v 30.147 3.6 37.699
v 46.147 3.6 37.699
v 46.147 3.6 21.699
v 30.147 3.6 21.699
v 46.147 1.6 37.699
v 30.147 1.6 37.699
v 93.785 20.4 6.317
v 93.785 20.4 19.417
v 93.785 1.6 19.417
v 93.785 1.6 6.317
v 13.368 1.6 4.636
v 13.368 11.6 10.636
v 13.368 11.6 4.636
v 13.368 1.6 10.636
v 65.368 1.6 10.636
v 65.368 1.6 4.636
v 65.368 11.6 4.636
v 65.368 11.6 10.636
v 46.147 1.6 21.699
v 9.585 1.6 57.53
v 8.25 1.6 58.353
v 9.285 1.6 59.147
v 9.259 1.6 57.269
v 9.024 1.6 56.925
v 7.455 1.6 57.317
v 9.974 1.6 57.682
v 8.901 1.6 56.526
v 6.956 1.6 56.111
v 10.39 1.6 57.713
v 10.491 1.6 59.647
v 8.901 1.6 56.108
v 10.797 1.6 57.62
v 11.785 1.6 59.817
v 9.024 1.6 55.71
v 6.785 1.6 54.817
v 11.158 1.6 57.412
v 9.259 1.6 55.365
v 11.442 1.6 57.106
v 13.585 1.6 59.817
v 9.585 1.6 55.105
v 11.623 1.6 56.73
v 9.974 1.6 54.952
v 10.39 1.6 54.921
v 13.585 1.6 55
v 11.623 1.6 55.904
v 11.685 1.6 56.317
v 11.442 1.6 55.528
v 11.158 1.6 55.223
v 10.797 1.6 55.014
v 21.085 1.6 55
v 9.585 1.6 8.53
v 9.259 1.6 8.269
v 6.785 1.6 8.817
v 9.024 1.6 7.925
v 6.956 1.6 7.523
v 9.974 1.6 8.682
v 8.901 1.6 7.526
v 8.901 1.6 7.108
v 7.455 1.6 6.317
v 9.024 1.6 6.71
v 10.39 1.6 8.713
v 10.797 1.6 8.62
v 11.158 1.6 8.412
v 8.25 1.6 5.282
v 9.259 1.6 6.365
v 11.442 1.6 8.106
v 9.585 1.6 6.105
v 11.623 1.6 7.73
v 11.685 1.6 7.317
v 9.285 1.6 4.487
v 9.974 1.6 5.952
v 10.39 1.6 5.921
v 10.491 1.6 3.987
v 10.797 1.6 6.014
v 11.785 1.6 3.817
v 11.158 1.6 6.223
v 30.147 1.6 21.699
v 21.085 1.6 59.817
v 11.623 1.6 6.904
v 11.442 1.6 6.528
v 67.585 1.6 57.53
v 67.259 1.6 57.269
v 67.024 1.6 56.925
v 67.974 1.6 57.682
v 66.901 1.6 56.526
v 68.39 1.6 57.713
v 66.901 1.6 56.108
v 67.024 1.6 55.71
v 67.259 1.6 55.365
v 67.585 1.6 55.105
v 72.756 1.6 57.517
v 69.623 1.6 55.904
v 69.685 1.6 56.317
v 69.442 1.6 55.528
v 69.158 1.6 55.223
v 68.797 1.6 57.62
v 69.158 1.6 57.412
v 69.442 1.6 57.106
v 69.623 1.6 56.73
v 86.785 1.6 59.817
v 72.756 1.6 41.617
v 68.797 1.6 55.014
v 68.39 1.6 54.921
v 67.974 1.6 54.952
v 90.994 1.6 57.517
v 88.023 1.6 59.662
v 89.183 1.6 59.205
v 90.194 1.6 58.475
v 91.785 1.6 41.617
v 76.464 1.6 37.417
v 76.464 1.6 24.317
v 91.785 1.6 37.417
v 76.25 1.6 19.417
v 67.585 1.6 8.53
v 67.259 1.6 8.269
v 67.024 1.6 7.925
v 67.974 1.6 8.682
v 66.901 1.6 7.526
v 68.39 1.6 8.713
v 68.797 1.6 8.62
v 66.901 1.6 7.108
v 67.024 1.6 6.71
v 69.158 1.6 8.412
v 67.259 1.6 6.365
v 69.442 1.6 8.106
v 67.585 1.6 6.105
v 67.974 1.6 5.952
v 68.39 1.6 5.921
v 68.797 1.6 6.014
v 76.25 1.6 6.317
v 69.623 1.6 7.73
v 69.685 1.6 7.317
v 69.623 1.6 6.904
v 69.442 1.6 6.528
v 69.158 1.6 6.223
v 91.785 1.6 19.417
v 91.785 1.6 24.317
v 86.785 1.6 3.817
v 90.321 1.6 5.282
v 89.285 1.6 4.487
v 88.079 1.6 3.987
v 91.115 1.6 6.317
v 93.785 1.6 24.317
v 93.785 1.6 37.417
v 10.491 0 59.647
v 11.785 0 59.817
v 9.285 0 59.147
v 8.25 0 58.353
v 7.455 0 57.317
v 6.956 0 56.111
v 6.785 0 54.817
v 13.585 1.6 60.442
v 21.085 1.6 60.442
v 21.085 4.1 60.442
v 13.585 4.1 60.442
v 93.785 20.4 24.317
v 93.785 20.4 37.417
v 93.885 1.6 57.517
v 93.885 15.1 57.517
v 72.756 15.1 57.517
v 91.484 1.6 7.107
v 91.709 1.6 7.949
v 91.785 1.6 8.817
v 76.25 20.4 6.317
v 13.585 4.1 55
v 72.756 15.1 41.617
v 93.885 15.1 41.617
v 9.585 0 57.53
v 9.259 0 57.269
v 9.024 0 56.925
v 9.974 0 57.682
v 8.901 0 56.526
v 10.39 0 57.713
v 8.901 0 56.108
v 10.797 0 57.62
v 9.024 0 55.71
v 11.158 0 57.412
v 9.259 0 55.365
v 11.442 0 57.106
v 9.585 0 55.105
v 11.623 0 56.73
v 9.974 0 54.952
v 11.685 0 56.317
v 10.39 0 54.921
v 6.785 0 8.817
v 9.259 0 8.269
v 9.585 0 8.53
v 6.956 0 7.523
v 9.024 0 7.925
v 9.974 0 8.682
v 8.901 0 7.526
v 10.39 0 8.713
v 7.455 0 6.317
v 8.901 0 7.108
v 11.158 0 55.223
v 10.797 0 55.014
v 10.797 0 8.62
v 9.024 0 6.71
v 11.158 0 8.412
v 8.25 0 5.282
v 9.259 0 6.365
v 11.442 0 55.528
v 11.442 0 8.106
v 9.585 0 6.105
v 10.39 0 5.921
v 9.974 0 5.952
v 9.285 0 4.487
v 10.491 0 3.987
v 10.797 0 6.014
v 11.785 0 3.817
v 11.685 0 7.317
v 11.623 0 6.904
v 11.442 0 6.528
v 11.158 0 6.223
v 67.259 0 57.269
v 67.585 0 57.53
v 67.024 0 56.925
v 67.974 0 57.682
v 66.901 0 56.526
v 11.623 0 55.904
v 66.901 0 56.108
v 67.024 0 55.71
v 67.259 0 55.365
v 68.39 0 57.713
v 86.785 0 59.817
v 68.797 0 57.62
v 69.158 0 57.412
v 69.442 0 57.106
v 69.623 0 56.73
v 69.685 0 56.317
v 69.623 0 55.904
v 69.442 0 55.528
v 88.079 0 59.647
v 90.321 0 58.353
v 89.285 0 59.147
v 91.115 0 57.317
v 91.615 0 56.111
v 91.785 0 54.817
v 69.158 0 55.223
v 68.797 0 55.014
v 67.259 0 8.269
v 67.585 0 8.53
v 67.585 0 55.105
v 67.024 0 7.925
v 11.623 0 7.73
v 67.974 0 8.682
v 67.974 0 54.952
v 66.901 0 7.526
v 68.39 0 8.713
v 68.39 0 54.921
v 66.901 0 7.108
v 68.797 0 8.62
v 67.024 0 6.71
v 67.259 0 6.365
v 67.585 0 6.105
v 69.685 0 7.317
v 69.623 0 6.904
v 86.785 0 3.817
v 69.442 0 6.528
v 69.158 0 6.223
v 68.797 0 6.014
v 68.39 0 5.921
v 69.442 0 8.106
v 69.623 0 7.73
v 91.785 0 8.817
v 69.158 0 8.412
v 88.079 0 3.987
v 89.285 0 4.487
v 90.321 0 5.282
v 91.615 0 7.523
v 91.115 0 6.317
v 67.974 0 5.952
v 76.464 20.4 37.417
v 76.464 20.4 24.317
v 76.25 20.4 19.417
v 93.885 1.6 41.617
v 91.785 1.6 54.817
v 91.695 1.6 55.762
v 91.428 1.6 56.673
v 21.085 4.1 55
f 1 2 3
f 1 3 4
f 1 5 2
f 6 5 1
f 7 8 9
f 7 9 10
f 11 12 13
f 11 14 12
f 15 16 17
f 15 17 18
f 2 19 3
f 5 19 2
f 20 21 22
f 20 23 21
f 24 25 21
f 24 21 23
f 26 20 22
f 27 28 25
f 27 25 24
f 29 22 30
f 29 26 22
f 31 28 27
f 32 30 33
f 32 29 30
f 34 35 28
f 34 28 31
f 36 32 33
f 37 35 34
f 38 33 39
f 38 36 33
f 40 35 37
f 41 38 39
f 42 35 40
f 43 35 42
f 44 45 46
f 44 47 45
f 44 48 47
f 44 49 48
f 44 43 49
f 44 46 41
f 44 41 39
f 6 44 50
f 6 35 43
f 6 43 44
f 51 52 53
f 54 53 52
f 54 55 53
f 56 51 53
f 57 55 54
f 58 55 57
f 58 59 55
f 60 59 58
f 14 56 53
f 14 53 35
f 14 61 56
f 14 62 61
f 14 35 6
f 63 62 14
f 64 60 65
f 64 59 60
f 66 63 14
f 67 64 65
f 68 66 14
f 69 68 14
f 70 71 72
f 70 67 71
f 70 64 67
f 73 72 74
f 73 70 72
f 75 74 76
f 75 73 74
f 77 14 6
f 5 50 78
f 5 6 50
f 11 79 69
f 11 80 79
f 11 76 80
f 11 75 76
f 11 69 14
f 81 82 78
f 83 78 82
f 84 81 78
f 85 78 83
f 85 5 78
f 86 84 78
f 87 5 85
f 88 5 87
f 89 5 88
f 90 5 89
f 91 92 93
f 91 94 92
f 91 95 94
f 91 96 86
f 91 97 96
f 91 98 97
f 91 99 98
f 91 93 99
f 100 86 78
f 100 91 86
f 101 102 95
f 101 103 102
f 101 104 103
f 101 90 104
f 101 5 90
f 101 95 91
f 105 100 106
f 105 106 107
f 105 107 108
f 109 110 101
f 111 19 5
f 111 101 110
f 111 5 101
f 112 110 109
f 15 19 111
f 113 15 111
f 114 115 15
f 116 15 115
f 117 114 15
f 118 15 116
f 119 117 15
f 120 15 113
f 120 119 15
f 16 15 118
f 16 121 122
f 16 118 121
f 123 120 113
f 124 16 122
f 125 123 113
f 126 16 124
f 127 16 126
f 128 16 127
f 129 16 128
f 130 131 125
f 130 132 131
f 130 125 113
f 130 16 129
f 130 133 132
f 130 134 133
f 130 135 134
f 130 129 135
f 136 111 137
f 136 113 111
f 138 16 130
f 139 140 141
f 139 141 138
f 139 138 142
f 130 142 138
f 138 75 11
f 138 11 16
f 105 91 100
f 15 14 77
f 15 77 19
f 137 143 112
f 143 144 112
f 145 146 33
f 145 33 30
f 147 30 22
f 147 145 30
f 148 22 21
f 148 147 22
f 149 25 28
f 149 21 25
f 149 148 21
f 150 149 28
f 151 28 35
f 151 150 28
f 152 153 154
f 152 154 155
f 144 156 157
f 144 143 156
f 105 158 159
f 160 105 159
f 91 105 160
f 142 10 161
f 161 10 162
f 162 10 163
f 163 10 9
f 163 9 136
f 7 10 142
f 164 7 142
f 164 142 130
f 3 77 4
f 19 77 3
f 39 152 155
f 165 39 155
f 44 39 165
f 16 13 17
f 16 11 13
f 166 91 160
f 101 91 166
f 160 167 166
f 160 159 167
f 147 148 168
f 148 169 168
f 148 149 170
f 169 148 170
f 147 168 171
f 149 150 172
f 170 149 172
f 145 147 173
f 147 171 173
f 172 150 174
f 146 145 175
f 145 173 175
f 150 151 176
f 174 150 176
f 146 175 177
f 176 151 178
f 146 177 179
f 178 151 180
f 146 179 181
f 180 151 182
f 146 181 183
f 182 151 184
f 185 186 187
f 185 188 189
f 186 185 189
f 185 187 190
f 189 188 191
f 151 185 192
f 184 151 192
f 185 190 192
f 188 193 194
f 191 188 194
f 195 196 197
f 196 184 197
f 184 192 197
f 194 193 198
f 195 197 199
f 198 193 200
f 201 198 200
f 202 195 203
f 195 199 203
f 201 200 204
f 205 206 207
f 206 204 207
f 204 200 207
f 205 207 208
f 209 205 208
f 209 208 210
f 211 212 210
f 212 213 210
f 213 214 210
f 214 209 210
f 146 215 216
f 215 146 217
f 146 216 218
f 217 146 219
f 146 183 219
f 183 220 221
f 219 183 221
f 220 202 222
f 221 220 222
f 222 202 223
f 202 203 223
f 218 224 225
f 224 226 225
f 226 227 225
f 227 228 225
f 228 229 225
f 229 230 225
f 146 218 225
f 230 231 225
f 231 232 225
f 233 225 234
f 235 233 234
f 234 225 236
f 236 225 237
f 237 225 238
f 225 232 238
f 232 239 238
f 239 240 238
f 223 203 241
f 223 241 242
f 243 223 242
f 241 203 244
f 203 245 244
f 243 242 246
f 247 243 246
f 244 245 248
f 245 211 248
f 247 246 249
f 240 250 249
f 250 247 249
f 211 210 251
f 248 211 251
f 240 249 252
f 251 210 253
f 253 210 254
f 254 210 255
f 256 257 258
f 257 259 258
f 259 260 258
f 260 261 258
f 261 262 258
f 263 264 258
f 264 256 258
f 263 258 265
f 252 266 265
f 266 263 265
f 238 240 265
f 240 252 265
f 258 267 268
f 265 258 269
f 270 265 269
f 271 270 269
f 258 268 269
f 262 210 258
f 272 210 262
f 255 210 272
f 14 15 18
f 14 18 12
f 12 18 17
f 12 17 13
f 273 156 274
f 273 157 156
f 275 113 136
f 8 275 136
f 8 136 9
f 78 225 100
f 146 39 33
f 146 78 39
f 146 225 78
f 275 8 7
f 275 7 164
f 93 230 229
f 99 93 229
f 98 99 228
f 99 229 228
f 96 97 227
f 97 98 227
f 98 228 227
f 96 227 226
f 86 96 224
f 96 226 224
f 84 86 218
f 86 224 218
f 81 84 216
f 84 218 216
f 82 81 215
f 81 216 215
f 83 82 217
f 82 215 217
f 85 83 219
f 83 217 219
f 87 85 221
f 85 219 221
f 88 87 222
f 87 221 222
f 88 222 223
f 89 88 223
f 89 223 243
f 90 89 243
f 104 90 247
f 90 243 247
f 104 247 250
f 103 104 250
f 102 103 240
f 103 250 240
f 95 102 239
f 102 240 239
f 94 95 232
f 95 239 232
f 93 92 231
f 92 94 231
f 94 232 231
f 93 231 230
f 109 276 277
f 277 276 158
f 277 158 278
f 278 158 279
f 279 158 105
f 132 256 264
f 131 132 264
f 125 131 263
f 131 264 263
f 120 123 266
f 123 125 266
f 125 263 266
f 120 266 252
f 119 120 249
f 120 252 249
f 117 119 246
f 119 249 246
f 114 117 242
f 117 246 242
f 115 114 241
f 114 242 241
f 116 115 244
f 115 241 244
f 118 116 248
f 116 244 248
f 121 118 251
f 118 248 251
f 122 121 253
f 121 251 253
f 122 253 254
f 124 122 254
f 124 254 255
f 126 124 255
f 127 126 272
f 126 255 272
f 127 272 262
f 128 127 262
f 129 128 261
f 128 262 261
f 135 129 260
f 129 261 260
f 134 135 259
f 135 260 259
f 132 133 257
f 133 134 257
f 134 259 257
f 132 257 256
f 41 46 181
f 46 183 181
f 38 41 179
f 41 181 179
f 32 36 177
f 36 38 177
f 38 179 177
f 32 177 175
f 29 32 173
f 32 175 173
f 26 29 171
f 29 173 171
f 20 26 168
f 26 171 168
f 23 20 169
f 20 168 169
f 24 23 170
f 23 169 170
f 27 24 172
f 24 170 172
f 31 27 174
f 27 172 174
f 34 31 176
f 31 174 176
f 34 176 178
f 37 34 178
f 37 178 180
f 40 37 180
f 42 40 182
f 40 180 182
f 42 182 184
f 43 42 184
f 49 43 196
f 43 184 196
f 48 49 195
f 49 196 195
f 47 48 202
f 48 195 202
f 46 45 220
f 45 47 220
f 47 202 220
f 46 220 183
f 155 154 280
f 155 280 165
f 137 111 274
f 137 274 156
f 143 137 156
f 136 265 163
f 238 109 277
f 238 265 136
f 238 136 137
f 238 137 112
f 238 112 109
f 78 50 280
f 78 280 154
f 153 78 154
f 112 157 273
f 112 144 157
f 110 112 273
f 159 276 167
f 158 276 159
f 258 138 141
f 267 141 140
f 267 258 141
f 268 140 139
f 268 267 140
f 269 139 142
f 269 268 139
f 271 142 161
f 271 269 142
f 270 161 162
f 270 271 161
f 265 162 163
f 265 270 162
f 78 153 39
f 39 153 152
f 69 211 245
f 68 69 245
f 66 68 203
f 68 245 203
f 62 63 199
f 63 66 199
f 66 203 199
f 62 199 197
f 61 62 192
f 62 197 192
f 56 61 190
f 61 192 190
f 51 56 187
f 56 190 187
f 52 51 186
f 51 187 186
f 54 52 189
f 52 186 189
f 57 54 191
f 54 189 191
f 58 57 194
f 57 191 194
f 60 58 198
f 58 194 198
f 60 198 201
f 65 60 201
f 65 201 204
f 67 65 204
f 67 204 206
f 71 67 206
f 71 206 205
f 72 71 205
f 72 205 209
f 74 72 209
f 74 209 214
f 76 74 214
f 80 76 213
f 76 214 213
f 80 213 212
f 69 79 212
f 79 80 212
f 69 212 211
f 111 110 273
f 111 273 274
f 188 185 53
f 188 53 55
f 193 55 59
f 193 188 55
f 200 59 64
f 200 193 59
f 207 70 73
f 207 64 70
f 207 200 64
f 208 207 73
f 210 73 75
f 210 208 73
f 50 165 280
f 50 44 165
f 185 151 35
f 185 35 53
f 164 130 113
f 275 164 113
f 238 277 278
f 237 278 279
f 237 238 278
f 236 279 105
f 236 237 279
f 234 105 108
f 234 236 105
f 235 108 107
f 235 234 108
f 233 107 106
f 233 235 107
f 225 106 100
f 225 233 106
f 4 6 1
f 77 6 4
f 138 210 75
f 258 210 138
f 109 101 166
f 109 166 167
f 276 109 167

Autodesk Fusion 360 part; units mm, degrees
sketch "Sketch1" plane through (0, 0, 0) normal (0, 1, 0) x (1, 0, 0)
  line L0 (11.7853, -3.8171) -> (86.7853, -3.8171)
  line L1 (91.7853, -8.8171) -> (91.7853, -54.8171)
  line L2 (86.7853, -59.8171) -> (11.7853, -59.8171)
  line L3 (6.7853, -54.8171) -> (6.7853, -8.8171)
  circle A0 centre (10.2853, -7.3171) radius 1.4
  circle A1 centre (10.2853, -56.3171) radius 1.4
  circle A2 centre (68.2853, -7.3171) radius 1.4
  circle A3 centre (68.2853, -56.3171) radius 1.4
  arc A4 (91.7853, -8.8171) -> (86.7853, -3.8171) centre (86.7853, -8.8171) ccw
  arc A5 (86.7853, -59.8171) -> (91.7853, -54.8171) centre (86.7853, -54.8171) ccw
  arc A6 (6.7853, -54.8171) -> (11.7853, -59.8171) centre (11.7853, -54.8171) ccw
  arc A7 (11.7853, -3.8171) -> (6.7853, -8.8171) centre (11.7853, -8.8171) ccw
  dimension "d1" = 85
  dimension "d2" = 56
  dimension "d3" = 58
  dimension "d4" = 2.8
  dimension "d5" = 3.5
  dimension "d6" = 3.5
  dimension "d7" = 49
  dimension "d8" = 5
extrude "Extrude1" add sketch "Sketch1" along normal blind 1.6 makes body 1
copy_body "Body->Comp1" bodies 1 removing the originals makes body 2 in component "PCB"
sketch "Sketch1 (2)" plane through (0, 1.6, 0) normal (0, 1, 0) x (-1, 0, 0) in component "Component"
  circle A0 centre (-68.2853, 56.3171) radius 1.4
  circle A1 centre (-68.2853, 7.3171) radius 1.4
  circle A2 centre (-10.2853, 7.3171) radius 1.4
  circle A3 centre (-10.2853, 56.3171) radius 1.4
  arc A4 (-91.7853, 8.8171) -> (-86.7853, 3.8171) centre (-86.7853, 8.8171) ccw
  line L0 (-86.7853, 3.8171) -> (-11.7853, 3.8171)
  arc A5 (-11.7853, 3.8171) -> (-6.7853, 8.8171) centre (-11.7853, 8.8171) ccw
  line L1 (-6.7853, 8.8171) -> (-6.7853, 54.8171)
  arc A6 (-6.7853, 54.8171) -> (-11.7853, 59.8171) centre (-11.7853, 54.8171) ccw
  line L2 (-11.7853, 59.8171) -> (-86.7853, 59.8171)
  arc A7 (-86.7853, 59.8171) -> (-91.7853, 54.8171) centre (-86.7853, 54.8171) ccw
  line L3 (-91.7853, 54.8171) -> (-91.7853, 8.8171)
  line L4 (-72.7561, 41.6171) -> (-93.8853, 41.6171)
  line L5 (-93.8853, 41.6171) -> (-93.8853, 57.5171)
  line L6 (-93.8853, 57.5171) -> (-72.7561, 57.5171)
  line L7 (-72.7561, 57.5171) -> (-72.7561, 41.6171)
  dimension "d11" = 15.9
  dimension "d12" = 2.3
  dimension "d13" = 87.1
extrude "Extrude1'" add sketch "Sketch1 (2)" along normal blind 13.5 contours A7 L3 L4 L5 L6 | A7 L3 L4 L6 L7 bodies 2 in component "PCB"
sketch "Sketch2" plane through (0, 1.6, 0) normal (0, 1, 0) x (-1, 0, 0)
  line L0 (-72.7561, 41.6171) -> (-91.7853, 41.6171)
  line L1 (-91.7853, 41.6171) -> (-91.7853, 8.8171)
  arc A0 (-91.7853, 8.8171) -> (-86.7853, 3.8171) centre (-86.7853, 8.8171) ccw
  line L2 (-86.7853, 3.8171) -> (-11.7853, 3.8171)
  arc A1 (-11.7853, 3.8171) -> (-6.7853, 8.8171) centre (-11.7853, 8.8171) ccw
  line L3 (-6.7853, 8.8171) -> (-6.7853, 54.8171)
  arc A2 (-6.7853, 54.8171) -> (-11.7853, 59.8171) centre (-11.7853, 54.8171) ccw
  line L4 (-11.7853, 59.8171) -> (-86.7853, 59.8171)
  arc A3 (-86.7853, 59.8171) -> (-90.9936, 57.5171) centre (-86.7853, 54.8171) ccw
  line L5 (-90.9936, 57.5171) -> (-72.7561, 57.5171)
  line L6 (-72.7561, 57.5171) -> (-72.7561, 41.6171)
  circle A4 centre (-68.2853, 56.3171) radius 1.4
  circle A5 centre (-68.2853, 7.3171) radius 1.4
  circle A6 centre (-10.2853, 56.3171) radius 1.4
  circle A7 centre (-10.2853, 7.3171) radius 1.4
  line L7 (-13.5853, 55) -> (-21.0853, 55)
  line L8 (-21.0853, 55) -> (-21.0853, 60.4415)
  line L9 (-21.0853, 60.4415) -> (-13.5853, 60.4415)
  line L10 (-13.5853, 60.4415) -> (-13.5853, 55)
  dimension "d16" = 7.5
  dimension "d17" = 6.8
extrude "Extrude2" add sketch "Sketch2" along normal blind 2.5 contours L4 L8 L9 L10 | L4 L7 L8 L10 bodies 2 in component "PCB"
sketch "Sketch3" plane through (0, 1.6, 0) normal (0, 1, 0) x (-1, 0, 0)
  line L0 (-21.0853, 55) -> (-21.0853, 59.8171)
  line L1 (-21.0853, 59.8171) -> (-86.7853, 59.8171)
  arc A0 (-86.7853, 59.8171) -> (-90.9936, 57.5171) centre (-86.7853, 54.8171) ccw
  line L2 (-90.9936, 57.5171) -> (-72.7561, 57.5171)
  line L3 (-72.7561, 57.5171) -> (-72.7561, 41.6171)
  line L4 (-72.7561, 41.6171) -> (-91.7853, 41.6171)
  line L5 (-91.7853, 41.6171) -> (-91.7853, 8.8171)
  arc A1 (-91.7853, 8.8171) -> (-86.7853, 3.8171) centre (-86.7853, 8.8171) ccw
  line L6 (-86.7853, 3.8171) -> (-11.7853, 3.8171)
  arc A2 (-11.7853, 3.8171) -> (-6.7853, 8.8171) centre (-11.7853, 8.8171) ccw
  line L7 (-6.7853, 8.8171) -> (-6.7853, 54.8171)
  arc A3 (-6.7853, 54.8171) -> (-11.7853, 59.8171) centre (-11.7853, 54.8171) ccw
  line L8 (-11.7853, 59.8171) -> (-13.5853, 59.8171)
  line L9 (-13.5853, 59.8171) -> (-13.5853, 55)
  line L10 (-13.5853, 55) -> (-21.0853, 55)
  circle A4 centre (-68.2853, 56.3171) radius 1.4
  circle A5 centre (-68.2853, 7.3171) radius 1.4
  circle A6 centre (-10.2853, 56.3171) radius 1.4
  circle A7 centre (-10.2853, 7.3171) radius 1.4
  line L11 (-13.3683, 4.6362) -> (-65.3683, 4.6362)
  line L12 (-65.3683, 4.6362) -> (-65.3683, 10.6362)
  line L13 (-65.3683, 10.6362) -> (-13.3683, 10.6362)
  line L14 (-13.3683, 10.6362) -> (-13.3683, 4.6362)
  dimension "d20" = 52
  dimension "d21" = 6
extrude "Extrude3" add sketch "Sketch3" along normal blind 10 contours L11 L12 L13 L14 bodies 2 in component "PCB"
sketch "Sketch4" plane through (0, 1.6, 0) normal (0, 1, 0) x (-1, 0, 0)
  line L0 (-13.3683, 10.6362) -> (-13.3683, 4.6362)
  line L1 (-13.3683, 4.6362) -> (-65.3683, 4.6362)
  line L2 (-65.3683, 4.6362) -> (-65.3683, 10.6362)
  line L3 (-65.3683, 10.6362) -> (-13.3683, 10.6362)
  line L4 (-21.0853, 55) -> (-21.0853, 59.8171)
  line L5 (-21.0853, 59.8171) -> (-86.7853, 59.8171)
  arc A0 (-86.7853, 59.8171) -> (-90.9936, 57.5171) centre (-86.7853, 54.8171) ccw
  line L6 (-90.9936, 57.5171) -> (-72.7561, 57.5171)
  line L7 (-72.7561, 57.5171) -> (-72.7561, 41.6171)
  line L8 (-72.7561, 41.6171) -> (-91.7853, 41.6171)
  line L9 (-91.7853, 41.6171) -> (-91.7853, 8.8171)
  arc A1 (-91.7853, 8.8171) -> (-86.7853, 3.8171) centre (-86.7853, 8.8171) ccw
  line L10 (-86.7853, 3.8171) -> (-11.7853, 3.8171)
  arc A2 (-11.7853, 3.8171) -> (-6.7853, 8.8171) centre (-11.7853, 8.8171) ccw
  line L11 (-6.7853, 8.8171) -> (-6.7853, 54.8171)
  arc A3 (-6.7853, 54.8171) -> (-11.7853, 59.8171) centre (-11.7853, 54.8171) ccw
  line L12 (-11.7853, 59.8171) -> (-13.5853, 59.8171)
  line L13 (-13.5853, 59.8171) -> (-13.5853, 55)
  line L14 (-13.5853, 55) -> (-21.0853, 55)
  circle A4 centre (-68.2853, 56.3171) radius 1.4
  circle A5 centre (-68.2853, 7.3171) radius 1.4
  circle A6 centre (-10.2853, 56.3171) radius 1.4
  circle A7 centre (-10.2853, 7.3171) radius 1.4
  line L15 (-30.1471, 21.6994) -> (-46.1471, 21.6994)
  line L16 (-46.1471, 21.6994) -> (-46.1471, 37.6994)
  line L17 (-46.1471, 37.6994) -> (-30.1471, 37.6994)
  line L18 (-30.1471, 37.6994) -> (-30.1471, 21.6994)
  dimension "d24" = 16
  dimension "d25" = 16
extrude "Extrude4" add sketch "Sketch4" along normal blind 2 contours L15 L16 L17 L18 bodies 2 in component "PCB"
sketch "Sketch5" plane through (0, 1.6, 0) normal (0, 1, 0) x (-1, 0, 0)
  line L0 (-30.1471, 37.6994) -> (-30.1471, 21.6994)
  line L1 (-30.1471, 21.6994) -> (-46.1471, 21.6994)
  line L2 (-46.1471, 21.6994) -> (-46.1471, 37.6994)
  line L3 (-46.1471, 37.6994) -> (-30.1471, 37.6994)
  line L4 (-13.3683, 10.6362) -> (-13.3683, 4.6362)
  line L5 (-13.3683, 4.6362) -> (-65.3683, 4.6362)
  line L6 (-65.3683, 4.6362) -> (-65.3683, 10.6362)
  line L7 (-65.3683, 10.6362) -> (-13.3683, 10.6362)
  line L8 (-21.0853, 55) -> (-21.0853, 59.8171)
  line L9 (-21.0853, 59.8171) -> (-86.7853, 59.8171)
  arc A0 (-86.7853, 59.8171) -> (-90.9936, 57.5171) centre (-86.7853, 54.8171) ccw
  line L10 (-90.9936, 57.5171) -> (-72.7561, 57.5171)
  line L11 (-72.7561, 57.5171) -> (-72.7561, 41.6171)
  line L12 (-72.7561, 41.6171) -> (-91.7853, 41.6171)
  line L13 (-91.7853, 41.6171) -> (-91.7853, 8.8171)
  arc A1 (-91.7853, 8.8171) -> (-86.7853, 3.8171) centre (-86.7853, 8.8171) ccw
  line L14 (-86.7853, 3.8171) -> (-11.7853, 3.8171)
  arc A2 (-11.7853, 3.8171) -> (-6.7853, 8.8171) centre (-11.7853, 8.8171) ccw
  line L15 (-6.7853, 8.8171) -> (-6.7853, 54.8171)
  arc A3 (-6.7853, 54.8171) -> (-11.7853, 59.8171) centre (-11.7853, 54.8171) ccw
  line L16 (-11.7853, 59.8171) -> (-13.5853, 59.8171)
  line L17 (-13.5853, 59.8171) -> (-13.5853, 55)
  line L18 (-13.5853, 55) -> (-21.0853, 55)
  circle A4 centre (-68.2853, 56.3171) radius 1.4
  circle A5 centre (-68.2853, 7.3171) radius 1.4
  circle A6 centre (-10.2853, 56.3171) radius 1.4
  circle A7 centre (-10.2853, 7.3171) radius 1.4
  line L19 (-76.4643, 24.3171) -> (-93.7853, 24.3171)
  line L20 (-93.7853, 24.3171) -> (-93.7853, 37.4171)
  line L21 (-93.7853, 37.4171) -> (-76.4643, 37.4171)
  line L22 (-76.4643, 37.4171) -> (-76.4643, 24.3171)
  line L23 (-76.2496, 19.4171) -> (-93.7853, 19.4171)
  line L24 (-93.7853, 19.4171) -> (-93.7853, 6.3171)
  line L25 (-93.7853, 6.3171) -> (-76.2496, 6.3171)
  line L26 (-76.2496, 6.3171) -> (-76.2496, 19.4171)
  dimension "d28" = 13.1
  dimension "d29" = 4.2
  dimension "d30" = 2
  dimension "d31" = 13.1
  dimension "d32" = 4.9
extrude "Extrude5" add sketch "Sketch5" along normal blind 18.8 contours L13 L19 L21 L22 | L13 L19 L20 L21 | L13 A1 L23 L24 L25 | L13 A1 L23 L25 L26 bodies 2 in component "PCB"
component "Component" placed x (1, 0, 0) y (0, 1, 0) z (0, 0, 1) at (0, 0, 0)
component "PCB" placed x (1, 0, 0) y (0, 1, 0) z (0, 0, 1) at (0, 0, 0)
